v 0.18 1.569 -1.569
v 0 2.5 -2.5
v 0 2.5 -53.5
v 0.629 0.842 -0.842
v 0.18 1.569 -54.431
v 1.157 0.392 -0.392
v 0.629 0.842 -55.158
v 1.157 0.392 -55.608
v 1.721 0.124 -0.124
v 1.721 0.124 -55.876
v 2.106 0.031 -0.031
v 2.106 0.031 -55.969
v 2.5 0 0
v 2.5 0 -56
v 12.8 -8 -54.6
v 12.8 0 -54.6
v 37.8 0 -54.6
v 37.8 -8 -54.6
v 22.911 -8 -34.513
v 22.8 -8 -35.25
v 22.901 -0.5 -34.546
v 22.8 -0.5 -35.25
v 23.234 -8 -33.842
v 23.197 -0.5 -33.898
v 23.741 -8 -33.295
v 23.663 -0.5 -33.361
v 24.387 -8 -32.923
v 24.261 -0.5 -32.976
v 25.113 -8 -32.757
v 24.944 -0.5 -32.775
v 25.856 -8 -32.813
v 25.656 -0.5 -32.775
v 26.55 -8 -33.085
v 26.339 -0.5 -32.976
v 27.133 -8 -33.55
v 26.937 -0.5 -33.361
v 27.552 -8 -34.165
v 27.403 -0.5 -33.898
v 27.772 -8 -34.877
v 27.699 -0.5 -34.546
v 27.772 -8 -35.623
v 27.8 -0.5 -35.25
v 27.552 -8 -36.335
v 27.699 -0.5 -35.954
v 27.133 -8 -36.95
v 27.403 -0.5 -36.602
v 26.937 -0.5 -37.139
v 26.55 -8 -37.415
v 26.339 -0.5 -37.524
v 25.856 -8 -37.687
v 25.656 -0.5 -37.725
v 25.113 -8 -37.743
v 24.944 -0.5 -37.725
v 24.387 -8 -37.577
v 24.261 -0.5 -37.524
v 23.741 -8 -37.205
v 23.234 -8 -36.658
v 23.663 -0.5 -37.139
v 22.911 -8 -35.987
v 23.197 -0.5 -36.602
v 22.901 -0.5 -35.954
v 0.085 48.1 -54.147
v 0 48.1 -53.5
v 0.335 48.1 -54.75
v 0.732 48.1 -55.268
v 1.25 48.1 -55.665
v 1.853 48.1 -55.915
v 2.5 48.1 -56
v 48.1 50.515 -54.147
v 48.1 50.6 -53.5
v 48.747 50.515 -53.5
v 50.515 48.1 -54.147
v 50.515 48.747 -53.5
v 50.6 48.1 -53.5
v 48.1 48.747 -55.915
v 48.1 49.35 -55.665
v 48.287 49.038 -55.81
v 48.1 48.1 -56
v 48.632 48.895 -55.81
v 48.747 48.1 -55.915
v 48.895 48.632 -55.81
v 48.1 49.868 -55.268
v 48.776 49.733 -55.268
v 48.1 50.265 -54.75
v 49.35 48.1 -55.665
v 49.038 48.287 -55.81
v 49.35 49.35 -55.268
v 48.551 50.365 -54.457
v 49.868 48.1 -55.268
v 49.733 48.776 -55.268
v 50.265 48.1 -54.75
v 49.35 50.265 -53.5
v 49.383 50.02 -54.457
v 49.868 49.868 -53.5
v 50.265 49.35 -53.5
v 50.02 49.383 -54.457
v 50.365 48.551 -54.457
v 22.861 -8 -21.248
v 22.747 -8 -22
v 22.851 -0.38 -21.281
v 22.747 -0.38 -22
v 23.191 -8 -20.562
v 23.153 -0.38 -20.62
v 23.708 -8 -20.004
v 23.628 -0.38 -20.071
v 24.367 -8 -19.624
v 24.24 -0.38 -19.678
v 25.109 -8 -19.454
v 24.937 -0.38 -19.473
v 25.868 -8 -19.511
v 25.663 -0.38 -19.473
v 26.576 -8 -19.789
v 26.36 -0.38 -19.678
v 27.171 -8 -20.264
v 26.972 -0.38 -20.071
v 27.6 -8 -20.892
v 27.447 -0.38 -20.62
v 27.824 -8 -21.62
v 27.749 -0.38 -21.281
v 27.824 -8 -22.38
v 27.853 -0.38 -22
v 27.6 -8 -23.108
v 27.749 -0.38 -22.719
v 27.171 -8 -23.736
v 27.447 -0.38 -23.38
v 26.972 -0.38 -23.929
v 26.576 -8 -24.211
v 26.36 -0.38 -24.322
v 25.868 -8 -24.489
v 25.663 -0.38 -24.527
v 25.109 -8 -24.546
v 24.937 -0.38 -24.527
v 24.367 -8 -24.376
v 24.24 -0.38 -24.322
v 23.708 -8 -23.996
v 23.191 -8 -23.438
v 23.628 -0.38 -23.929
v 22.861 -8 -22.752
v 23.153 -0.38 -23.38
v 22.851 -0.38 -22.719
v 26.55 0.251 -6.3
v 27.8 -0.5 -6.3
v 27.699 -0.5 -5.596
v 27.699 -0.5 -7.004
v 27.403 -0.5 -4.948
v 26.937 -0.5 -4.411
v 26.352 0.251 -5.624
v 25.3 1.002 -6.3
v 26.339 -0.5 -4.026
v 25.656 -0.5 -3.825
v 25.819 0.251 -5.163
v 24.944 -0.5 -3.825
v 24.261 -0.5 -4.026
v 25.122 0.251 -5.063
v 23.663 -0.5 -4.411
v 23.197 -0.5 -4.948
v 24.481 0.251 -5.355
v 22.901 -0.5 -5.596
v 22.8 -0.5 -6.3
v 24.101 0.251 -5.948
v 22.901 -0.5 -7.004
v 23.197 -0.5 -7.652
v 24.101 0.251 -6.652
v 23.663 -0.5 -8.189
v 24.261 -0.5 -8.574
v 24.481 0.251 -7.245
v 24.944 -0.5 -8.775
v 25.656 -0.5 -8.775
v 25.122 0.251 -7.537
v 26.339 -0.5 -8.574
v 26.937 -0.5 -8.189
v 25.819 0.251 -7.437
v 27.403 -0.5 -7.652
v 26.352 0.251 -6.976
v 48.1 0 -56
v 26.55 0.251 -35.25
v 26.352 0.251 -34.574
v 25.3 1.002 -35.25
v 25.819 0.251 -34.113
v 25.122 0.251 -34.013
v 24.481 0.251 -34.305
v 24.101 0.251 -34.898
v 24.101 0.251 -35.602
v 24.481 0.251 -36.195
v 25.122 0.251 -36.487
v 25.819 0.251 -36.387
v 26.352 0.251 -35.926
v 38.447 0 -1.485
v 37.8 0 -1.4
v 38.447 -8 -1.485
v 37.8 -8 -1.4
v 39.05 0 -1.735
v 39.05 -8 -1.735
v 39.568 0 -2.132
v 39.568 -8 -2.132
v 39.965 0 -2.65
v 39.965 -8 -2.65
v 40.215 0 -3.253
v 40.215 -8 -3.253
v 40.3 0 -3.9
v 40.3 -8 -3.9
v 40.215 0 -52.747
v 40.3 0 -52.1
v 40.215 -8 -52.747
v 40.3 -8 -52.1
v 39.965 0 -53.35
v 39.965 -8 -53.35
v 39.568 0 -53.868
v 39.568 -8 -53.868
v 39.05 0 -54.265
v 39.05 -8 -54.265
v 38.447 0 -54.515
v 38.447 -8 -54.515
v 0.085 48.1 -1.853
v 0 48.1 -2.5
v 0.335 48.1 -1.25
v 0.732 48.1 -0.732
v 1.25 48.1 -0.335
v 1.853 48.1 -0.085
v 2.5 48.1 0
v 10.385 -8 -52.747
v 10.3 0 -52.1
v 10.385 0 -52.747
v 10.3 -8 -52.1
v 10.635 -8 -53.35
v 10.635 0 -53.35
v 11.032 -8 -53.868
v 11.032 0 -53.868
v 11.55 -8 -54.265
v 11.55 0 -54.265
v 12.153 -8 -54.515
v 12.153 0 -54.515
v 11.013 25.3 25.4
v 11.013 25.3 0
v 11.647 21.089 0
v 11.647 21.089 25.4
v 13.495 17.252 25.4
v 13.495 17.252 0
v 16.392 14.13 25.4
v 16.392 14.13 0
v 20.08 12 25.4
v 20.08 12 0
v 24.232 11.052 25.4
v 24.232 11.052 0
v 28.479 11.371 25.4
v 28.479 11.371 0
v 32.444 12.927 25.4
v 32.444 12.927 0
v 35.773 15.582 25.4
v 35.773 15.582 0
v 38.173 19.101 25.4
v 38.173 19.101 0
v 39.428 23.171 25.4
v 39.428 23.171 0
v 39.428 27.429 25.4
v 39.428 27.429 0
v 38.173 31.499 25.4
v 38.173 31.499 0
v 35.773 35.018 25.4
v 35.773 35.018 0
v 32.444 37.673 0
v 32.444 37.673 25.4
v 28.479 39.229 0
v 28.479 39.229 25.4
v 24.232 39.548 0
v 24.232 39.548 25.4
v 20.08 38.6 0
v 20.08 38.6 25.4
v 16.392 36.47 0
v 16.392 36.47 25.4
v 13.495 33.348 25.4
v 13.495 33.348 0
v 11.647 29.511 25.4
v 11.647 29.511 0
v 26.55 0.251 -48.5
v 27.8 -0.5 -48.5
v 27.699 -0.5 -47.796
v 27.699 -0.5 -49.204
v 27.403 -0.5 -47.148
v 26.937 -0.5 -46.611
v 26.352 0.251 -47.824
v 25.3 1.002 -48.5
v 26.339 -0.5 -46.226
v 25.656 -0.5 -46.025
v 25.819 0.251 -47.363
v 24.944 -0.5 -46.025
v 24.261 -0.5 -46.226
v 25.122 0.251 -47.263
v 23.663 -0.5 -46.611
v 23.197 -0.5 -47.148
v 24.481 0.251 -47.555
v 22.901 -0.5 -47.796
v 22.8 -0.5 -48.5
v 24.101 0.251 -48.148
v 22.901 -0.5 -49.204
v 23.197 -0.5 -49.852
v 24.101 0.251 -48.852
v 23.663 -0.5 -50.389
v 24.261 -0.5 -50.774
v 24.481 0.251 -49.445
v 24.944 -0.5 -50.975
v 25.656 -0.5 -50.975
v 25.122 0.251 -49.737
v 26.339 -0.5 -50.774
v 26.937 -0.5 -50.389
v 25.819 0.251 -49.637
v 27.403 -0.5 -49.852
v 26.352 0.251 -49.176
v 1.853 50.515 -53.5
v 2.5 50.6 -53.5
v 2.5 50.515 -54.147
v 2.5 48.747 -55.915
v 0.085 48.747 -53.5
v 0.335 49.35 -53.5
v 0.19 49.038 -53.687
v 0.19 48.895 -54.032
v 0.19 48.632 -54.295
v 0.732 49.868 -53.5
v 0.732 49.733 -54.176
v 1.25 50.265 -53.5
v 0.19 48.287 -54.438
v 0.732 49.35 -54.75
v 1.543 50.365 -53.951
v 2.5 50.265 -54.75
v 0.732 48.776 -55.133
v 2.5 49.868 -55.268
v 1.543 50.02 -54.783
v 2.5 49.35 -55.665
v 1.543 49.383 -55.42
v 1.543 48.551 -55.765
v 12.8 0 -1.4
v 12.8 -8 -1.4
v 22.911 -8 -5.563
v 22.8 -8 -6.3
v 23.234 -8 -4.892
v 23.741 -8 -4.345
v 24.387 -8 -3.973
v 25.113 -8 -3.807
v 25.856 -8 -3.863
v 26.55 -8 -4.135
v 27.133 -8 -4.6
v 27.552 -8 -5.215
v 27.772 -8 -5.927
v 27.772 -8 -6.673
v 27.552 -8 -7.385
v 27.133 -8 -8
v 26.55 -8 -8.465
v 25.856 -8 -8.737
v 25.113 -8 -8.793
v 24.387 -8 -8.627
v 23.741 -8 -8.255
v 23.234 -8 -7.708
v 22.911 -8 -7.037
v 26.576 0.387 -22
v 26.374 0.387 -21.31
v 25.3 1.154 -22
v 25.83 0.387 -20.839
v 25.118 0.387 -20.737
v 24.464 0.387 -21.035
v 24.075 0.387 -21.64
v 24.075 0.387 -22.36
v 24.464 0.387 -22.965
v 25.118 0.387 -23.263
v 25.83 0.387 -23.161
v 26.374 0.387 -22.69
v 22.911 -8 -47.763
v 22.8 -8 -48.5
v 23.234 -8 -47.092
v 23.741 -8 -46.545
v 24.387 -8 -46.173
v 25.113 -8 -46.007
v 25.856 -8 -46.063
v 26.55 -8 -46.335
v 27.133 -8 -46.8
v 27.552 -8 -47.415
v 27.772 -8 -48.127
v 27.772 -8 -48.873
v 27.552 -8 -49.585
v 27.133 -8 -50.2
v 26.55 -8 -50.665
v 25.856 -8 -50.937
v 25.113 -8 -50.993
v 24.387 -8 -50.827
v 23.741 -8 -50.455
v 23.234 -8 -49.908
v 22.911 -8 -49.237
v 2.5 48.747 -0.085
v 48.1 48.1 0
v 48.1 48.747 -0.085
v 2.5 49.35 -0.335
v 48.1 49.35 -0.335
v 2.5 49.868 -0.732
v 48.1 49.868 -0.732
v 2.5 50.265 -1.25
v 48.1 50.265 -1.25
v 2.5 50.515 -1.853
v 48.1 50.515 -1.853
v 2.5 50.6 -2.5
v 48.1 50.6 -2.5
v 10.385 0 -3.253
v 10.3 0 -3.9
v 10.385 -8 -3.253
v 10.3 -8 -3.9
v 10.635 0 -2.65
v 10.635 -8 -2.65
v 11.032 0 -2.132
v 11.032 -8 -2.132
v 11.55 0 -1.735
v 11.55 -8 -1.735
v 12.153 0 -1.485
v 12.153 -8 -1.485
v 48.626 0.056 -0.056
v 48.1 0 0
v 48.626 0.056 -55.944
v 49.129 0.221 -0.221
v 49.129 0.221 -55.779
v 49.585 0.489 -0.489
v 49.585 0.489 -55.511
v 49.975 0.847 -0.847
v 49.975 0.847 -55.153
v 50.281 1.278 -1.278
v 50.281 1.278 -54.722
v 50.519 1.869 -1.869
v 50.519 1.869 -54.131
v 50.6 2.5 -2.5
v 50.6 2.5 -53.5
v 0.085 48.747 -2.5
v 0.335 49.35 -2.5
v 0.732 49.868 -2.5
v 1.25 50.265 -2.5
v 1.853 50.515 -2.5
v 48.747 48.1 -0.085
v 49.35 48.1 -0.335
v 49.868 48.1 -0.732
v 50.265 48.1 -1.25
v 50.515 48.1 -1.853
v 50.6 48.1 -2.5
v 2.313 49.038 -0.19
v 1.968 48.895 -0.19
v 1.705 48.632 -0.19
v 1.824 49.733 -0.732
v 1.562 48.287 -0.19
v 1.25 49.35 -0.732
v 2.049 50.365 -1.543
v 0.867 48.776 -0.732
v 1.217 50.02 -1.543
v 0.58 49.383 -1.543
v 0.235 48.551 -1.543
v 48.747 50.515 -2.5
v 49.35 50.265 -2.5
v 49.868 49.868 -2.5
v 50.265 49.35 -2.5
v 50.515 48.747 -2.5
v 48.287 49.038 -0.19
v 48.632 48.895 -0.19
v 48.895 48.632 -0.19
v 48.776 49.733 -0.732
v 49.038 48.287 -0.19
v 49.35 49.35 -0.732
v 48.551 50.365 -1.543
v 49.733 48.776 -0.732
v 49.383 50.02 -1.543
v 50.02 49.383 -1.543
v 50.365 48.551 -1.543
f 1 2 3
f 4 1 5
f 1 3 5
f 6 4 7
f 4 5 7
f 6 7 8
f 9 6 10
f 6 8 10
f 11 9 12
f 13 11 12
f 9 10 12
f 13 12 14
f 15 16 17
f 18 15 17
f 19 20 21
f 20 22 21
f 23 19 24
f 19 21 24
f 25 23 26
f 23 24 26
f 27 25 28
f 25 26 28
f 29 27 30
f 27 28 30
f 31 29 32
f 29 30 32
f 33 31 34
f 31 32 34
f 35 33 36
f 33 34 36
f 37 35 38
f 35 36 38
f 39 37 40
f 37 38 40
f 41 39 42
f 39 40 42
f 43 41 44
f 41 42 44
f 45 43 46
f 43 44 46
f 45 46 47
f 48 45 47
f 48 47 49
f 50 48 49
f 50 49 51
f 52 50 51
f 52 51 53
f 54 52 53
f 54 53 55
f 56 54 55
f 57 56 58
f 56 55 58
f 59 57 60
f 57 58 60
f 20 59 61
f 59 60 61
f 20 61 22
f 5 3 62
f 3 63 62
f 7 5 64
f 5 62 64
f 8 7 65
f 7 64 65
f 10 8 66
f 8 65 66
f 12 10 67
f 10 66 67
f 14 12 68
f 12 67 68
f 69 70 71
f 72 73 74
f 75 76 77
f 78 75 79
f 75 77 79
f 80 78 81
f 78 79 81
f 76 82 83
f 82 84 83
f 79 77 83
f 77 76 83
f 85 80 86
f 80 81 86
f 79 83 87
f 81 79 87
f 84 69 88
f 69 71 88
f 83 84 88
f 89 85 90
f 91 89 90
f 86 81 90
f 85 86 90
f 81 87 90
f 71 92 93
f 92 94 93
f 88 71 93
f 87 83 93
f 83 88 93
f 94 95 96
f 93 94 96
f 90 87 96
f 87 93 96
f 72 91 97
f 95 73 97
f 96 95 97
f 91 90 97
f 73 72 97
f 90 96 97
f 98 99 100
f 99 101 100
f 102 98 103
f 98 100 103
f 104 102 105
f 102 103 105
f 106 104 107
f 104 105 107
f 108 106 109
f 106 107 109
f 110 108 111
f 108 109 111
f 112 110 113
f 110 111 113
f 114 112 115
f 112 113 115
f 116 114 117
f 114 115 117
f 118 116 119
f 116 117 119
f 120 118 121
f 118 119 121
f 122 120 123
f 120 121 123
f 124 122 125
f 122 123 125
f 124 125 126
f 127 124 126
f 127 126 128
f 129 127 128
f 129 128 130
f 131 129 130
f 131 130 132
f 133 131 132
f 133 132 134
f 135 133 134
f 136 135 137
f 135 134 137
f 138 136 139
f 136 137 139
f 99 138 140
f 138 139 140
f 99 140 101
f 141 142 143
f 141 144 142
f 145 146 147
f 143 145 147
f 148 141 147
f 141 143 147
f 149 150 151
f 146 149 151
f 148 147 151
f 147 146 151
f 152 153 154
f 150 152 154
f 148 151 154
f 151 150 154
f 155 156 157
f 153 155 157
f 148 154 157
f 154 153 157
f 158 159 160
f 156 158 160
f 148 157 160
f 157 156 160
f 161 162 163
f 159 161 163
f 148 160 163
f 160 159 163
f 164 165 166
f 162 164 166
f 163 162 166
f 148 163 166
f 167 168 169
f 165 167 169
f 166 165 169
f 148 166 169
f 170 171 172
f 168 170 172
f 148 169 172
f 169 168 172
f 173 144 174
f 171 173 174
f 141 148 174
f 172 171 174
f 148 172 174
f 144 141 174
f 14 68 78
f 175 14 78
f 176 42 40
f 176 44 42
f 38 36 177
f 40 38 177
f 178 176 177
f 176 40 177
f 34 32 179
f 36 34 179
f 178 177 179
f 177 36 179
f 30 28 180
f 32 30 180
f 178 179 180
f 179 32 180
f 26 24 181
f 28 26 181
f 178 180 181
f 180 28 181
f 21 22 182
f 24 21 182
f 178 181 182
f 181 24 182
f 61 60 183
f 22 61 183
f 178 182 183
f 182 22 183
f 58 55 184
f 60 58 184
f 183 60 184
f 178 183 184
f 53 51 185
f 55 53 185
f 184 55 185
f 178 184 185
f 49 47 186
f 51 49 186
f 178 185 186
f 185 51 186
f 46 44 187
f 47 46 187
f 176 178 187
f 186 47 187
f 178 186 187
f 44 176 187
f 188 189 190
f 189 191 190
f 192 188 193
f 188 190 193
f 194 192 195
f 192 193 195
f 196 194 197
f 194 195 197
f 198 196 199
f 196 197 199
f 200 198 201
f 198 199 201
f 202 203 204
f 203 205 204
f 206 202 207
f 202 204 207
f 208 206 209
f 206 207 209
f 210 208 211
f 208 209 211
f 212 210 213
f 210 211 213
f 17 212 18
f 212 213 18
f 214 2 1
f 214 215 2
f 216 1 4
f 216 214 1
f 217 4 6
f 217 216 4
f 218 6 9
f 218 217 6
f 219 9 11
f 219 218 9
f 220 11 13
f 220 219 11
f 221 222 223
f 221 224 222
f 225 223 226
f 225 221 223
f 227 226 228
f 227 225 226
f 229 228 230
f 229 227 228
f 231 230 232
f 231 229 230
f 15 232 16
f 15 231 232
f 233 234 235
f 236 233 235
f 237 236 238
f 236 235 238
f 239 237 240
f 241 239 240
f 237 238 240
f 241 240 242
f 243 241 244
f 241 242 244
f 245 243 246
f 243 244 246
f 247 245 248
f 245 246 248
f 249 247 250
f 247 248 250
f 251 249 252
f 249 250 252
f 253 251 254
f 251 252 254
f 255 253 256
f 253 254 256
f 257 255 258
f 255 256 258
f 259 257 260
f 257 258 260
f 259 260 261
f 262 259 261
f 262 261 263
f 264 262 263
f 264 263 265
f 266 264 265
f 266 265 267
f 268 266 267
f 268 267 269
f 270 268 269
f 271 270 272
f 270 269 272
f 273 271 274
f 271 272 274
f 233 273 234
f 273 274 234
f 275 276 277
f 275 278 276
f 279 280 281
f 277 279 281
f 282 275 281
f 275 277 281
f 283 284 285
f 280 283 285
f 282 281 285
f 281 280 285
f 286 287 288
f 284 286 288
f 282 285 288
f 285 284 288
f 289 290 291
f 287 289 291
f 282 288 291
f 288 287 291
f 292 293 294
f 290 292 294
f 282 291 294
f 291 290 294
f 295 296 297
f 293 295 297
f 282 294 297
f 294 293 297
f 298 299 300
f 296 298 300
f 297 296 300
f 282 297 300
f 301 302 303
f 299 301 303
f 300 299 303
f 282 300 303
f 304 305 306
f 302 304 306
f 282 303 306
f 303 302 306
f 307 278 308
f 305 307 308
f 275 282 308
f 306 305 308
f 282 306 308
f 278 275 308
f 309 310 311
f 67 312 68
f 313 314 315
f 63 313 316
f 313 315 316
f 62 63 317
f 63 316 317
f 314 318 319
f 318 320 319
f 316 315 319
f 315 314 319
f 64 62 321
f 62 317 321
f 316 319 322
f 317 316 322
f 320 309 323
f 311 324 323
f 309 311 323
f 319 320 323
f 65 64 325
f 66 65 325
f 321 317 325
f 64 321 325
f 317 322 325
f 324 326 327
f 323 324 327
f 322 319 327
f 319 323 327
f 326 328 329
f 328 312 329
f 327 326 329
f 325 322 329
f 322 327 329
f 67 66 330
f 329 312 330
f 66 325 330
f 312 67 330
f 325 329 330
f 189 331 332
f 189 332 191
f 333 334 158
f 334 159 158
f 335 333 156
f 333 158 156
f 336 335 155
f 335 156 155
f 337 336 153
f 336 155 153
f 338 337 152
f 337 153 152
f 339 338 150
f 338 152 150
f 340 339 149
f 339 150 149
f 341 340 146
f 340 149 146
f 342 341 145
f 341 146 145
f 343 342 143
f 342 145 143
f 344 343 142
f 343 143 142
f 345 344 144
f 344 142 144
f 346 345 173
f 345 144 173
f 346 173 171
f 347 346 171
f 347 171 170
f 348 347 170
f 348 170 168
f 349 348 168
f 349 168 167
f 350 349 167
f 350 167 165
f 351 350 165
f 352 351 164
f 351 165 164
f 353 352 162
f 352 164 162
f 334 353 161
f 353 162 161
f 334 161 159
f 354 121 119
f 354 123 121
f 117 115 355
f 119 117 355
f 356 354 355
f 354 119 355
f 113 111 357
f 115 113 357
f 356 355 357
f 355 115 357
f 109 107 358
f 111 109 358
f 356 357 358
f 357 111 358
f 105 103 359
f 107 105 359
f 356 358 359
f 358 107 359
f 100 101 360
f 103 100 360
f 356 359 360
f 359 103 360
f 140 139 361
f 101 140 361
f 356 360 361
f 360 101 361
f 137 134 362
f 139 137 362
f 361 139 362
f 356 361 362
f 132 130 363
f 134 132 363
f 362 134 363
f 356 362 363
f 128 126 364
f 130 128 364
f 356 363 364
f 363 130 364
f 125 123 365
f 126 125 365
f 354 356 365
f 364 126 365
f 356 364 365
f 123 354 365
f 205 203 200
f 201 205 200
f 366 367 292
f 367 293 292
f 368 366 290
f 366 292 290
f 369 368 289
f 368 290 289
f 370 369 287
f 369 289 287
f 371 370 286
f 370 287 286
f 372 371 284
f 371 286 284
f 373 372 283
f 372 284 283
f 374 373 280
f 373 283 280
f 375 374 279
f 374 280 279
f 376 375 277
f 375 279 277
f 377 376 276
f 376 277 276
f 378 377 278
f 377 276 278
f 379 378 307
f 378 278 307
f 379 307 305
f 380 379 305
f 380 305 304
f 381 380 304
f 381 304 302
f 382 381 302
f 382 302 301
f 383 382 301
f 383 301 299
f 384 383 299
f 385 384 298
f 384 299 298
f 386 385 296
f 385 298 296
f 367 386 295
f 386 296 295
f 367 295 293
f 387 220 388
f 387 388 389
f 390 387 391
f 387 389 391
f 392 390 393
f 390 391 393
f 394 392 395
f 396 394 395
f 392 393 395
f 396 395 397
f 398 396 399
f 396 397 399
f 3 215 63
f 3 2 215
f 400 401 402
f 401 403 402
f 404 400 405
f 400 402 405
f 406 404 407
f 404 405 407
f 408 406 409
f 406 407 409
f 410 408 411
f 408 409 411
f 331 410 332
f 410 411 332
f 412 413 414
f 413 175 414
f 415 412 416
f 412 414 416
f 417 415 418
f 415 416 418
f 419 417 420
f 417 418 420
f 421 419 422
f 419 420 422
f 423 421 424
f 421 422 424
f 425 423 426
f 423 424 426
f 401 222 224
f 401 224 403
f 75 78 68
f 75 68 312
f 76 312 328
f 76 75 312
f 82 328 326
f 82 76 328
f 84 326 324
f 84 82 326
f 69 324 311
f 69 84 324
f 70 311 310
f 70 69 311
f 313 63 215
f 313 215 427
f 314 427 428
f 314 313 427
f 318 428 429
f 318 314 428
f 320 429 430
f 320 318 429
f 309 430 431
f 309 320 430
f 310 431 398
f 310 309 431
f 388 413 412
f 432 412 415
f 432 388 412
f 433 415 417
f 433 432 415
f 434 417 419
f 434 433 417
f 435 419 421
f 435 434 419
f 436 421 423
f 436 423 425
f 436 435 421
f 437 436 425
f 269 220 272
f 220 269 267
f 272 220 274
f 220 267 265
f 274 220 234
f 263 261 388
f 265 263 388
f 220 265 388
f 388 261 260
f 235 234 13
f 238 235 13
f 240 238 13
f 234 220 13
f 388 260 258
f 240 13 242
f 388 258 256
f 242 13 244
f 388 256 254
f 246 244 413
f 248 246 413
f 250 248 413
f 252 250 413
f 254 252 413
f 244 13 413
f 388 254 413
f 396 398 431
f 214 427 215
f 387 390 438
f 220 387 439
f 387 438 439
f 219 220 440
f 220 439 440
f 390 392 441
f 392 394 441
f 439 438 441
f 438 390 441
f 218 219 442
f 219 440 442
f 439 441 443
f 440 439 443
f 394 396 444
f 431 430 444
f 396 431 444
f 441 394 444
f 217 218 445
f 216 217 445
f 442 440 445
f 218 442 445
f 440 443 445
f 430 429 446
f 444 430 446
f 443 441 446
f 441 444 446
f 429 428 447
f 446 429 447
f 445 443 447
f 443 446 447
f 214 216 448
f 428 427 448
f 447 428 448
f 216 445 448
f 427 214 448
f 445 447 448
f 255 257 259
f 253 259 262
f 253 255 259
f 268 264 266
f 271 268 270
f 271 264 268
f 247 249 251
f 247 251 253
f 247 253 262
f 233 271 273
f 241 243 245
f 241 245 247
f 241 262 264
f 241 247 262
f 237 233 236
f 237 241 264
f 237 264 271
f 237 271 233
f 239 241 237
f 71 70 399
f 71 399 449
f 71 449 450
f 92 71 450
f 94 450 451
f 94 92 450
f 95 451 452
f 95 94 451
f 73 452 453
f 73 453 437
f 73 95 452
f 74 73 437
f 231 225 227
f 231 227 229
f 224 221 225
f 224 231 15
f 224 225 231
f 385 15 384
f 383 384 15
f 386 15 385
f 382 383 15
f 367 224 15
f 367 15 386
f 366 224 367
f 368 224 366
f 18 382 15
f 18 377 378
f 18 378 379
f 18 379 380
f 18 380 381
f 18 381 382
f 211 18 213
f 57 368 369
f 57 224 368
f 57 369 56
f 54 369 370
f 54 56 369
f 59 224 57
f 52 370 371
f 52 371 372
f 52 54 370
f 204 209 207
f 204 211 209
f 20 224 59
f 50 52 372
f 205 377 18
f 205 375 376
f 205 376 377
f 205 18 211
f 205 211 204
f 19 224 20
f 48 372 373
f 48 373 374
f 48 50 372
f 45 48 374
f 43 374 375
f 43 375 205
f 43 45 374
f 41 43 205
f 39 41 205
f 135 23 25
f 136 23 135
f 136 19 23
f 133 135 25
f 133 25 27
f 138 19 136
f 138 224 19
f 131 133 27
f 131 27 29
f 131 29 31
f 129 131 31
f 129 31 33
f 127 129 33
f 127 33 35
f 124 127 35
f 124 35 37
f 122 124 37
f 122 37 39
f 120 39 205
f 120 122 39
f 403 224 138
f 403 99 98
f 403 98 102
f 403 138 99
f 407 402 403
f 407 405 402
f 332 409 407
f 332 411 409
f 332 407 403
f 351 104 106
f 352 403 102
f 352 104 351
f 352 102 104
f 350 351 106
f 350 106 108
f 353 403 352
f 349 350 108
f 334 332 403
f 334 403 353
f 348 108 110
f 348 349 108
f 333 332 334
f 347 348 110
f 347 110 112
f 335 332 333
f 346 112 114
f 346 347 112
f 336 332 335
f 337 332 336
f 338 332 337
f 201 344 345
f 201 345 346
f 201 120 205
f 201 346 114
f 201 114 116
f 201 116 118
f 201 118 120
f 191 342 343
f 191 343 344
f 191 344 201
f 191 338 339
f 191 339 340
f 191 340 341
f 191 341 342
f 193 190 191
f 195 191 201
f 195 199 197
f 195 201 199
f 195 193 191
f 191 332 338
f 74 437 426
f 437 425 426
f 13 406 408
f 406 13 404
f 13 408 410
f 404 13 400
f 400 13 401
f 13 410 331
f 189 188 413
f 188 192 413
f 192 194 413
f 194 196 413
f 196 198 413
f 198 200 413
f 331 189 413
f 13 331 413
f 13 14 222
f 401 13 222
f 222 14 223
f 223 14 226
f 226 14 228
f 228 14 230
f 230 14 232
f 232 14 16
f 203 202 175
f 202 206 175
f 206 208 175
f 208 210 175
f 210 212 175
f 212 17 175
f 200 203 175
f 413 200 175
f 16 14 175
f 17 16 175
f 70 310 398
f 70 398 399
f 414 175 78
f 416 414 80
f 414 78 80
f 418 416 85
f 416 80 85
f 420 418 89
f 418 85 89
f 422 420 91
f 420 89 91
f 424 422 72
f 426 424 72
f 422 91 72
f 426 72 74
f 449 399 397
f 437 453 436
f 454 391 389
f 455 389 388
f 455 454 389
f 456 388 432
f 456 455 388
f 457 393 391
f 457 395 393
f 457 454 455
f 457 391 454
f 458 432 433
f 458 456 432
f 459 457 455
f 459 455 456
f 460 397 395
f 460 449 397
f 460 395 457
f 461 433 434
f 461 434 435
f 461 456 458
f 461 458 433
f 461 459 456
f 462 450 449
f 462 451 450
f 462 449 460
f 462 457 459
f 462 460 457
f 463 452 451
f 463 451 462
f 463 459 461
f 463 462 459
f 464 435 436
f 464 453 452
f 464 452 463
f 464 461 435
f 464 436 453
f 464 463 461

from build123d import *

# Parameters (mm, degrees)
SKETCH2_W                       = 50.6
SKETCH2_H                       = 56
BOSS_EXTRUDE1_DEPTH             = 50.6
SKETCH3_W                       = 30
SKETCH3_H                       = 53.2
BOSS_EXTRUDE2_DEPTH             = 8
TAP_DRILL_FOR_M6X1_0_TAP1_D     = 5
TAP_DRILL_FOR_M6X1_0_TAP1_DEPTH = 7.5000104
TAP_DRILL_FOR_M6X1_0_TAP1_TIP   = 1.502151548
TAP_DRILL_FOR_1_4_20_TAP1_D     = 5.1054
TAP_DRILL_FOR_1_4_20_TAP1_DEPTH = 7.62
TAP_DRILL_FOR_1_4_20_TAP1_TIP   = 1.533816902
SKETCH11_R                      = 14.2875
BOSS_EXTRUDE3_DEPTH             = 25.4
FILLET1_R                       = 2.5


with BuildPart() as part:
    # Sketch2 → Boss-Extrude1 (new body)
    with BuildSketch(Plane(origin=(0, 0, 0), x_dir=(1, 0, 0), z_dir=(0, 1, 0))):
        with Locations((25.3, 28)):
            Rectangle(SKETCH2_W, SKETCH2_H)
    extrude(amount=BOSS_EXTRUDE1_DEPTH)

    # Sketch3 → Boss-Extrude2 (add)
    with BuildSketch(Plane.XZ):
        with Locations((25.3, -28)):
            Rectangle(SKETCH3_W, SKETCH3_H)
    extrude(amount=BOSS_EXTRUDE2_DEPTH)

    # Tap Drill for M6x1.0 Tap1
    with Locations(Plane.XZ.offset(8)):
        with Locations((25.3, -35.25), (25.3, -48.5), (25.3, -6.3)):
            Hole(TAP_DRILL_FOR_M6X1_0_TAP1_D / 2, depth=TAP_DRILL_FOR_M6X1_0_TAP1_DEPTH)
            with Locations((0, 0, -(TAP_DRILL_FOR_M6X1_0_TAP1_DEPTH + TAP_DRILL_FOR_M6X1_0_TAP1_TIP / 2))):  # 118° drill point
                Cone(0, TAP_DRILL_FOR_M6X1_0_TAP1_D / 2, TAP_DRILL_FOR_M6X1_0_TAP1_TIP, mode=Mode.SUBTRACT)

    # Tap Drill for 1/4-20 Tap1
    with Locations(Plane.XZ.offset(8)):
        with Locations((25.3, -22)):
            Hole(TAP_DRILL_FOR_1_4_20_TAP1_D / 2, depth=TAP_DRILL_FOR_1_4_20_TAP1_DEPTH)
            with Locations((0, 0, -(TAP_DRILL_FOR_1_4_20_TAP1_DEPTH + TAP_DRILL_FOR_1_4_20_TAP1_TIP / 2))):  # 118° drill point
                Cone(0, TAP_DRILL_FOR_1_4_20_TAP1_D / 2, TAP_DRILL_FOR_1_4_20_TAP1_TIP, mode=Mode.SUBTRACT)

    # Sketch11 → Boss-Extrude3 (add)
    with BuildSketch(Plane.XY):
        with Locations(Location((25.3, 25.3, 0), (0, 0, 180))):
            Circle(SKETCH11_R)
    extrude(amount=BOSS_EXTRUDE3_DEPTH)

    # Fillet1
    fillet1_edges = [part.edges().sort_by_distance(p)[0] for p in [
        (50.6, 50.6, -28),
        (25.3, 50.6, -56),
        (10.3, -4, -1.4),
        (10.3, -4, -54.6),
        (40.3, -4, -54.6),
        (40.3, -4, -1.4),
        (0, 50.6, -28),
        (50.6, 0, -28),
        (0, 0, -28),
        (25.3, 50.6, 0),
        (0, 25.3, -56),
        (50.6, 25.3, -56),
        (50.6, 25.3, 0),
        (0, 25.3, 0),
    ]]
    fillet(fillet1_edges, radius=FILLET1_R)


solid = part.part
